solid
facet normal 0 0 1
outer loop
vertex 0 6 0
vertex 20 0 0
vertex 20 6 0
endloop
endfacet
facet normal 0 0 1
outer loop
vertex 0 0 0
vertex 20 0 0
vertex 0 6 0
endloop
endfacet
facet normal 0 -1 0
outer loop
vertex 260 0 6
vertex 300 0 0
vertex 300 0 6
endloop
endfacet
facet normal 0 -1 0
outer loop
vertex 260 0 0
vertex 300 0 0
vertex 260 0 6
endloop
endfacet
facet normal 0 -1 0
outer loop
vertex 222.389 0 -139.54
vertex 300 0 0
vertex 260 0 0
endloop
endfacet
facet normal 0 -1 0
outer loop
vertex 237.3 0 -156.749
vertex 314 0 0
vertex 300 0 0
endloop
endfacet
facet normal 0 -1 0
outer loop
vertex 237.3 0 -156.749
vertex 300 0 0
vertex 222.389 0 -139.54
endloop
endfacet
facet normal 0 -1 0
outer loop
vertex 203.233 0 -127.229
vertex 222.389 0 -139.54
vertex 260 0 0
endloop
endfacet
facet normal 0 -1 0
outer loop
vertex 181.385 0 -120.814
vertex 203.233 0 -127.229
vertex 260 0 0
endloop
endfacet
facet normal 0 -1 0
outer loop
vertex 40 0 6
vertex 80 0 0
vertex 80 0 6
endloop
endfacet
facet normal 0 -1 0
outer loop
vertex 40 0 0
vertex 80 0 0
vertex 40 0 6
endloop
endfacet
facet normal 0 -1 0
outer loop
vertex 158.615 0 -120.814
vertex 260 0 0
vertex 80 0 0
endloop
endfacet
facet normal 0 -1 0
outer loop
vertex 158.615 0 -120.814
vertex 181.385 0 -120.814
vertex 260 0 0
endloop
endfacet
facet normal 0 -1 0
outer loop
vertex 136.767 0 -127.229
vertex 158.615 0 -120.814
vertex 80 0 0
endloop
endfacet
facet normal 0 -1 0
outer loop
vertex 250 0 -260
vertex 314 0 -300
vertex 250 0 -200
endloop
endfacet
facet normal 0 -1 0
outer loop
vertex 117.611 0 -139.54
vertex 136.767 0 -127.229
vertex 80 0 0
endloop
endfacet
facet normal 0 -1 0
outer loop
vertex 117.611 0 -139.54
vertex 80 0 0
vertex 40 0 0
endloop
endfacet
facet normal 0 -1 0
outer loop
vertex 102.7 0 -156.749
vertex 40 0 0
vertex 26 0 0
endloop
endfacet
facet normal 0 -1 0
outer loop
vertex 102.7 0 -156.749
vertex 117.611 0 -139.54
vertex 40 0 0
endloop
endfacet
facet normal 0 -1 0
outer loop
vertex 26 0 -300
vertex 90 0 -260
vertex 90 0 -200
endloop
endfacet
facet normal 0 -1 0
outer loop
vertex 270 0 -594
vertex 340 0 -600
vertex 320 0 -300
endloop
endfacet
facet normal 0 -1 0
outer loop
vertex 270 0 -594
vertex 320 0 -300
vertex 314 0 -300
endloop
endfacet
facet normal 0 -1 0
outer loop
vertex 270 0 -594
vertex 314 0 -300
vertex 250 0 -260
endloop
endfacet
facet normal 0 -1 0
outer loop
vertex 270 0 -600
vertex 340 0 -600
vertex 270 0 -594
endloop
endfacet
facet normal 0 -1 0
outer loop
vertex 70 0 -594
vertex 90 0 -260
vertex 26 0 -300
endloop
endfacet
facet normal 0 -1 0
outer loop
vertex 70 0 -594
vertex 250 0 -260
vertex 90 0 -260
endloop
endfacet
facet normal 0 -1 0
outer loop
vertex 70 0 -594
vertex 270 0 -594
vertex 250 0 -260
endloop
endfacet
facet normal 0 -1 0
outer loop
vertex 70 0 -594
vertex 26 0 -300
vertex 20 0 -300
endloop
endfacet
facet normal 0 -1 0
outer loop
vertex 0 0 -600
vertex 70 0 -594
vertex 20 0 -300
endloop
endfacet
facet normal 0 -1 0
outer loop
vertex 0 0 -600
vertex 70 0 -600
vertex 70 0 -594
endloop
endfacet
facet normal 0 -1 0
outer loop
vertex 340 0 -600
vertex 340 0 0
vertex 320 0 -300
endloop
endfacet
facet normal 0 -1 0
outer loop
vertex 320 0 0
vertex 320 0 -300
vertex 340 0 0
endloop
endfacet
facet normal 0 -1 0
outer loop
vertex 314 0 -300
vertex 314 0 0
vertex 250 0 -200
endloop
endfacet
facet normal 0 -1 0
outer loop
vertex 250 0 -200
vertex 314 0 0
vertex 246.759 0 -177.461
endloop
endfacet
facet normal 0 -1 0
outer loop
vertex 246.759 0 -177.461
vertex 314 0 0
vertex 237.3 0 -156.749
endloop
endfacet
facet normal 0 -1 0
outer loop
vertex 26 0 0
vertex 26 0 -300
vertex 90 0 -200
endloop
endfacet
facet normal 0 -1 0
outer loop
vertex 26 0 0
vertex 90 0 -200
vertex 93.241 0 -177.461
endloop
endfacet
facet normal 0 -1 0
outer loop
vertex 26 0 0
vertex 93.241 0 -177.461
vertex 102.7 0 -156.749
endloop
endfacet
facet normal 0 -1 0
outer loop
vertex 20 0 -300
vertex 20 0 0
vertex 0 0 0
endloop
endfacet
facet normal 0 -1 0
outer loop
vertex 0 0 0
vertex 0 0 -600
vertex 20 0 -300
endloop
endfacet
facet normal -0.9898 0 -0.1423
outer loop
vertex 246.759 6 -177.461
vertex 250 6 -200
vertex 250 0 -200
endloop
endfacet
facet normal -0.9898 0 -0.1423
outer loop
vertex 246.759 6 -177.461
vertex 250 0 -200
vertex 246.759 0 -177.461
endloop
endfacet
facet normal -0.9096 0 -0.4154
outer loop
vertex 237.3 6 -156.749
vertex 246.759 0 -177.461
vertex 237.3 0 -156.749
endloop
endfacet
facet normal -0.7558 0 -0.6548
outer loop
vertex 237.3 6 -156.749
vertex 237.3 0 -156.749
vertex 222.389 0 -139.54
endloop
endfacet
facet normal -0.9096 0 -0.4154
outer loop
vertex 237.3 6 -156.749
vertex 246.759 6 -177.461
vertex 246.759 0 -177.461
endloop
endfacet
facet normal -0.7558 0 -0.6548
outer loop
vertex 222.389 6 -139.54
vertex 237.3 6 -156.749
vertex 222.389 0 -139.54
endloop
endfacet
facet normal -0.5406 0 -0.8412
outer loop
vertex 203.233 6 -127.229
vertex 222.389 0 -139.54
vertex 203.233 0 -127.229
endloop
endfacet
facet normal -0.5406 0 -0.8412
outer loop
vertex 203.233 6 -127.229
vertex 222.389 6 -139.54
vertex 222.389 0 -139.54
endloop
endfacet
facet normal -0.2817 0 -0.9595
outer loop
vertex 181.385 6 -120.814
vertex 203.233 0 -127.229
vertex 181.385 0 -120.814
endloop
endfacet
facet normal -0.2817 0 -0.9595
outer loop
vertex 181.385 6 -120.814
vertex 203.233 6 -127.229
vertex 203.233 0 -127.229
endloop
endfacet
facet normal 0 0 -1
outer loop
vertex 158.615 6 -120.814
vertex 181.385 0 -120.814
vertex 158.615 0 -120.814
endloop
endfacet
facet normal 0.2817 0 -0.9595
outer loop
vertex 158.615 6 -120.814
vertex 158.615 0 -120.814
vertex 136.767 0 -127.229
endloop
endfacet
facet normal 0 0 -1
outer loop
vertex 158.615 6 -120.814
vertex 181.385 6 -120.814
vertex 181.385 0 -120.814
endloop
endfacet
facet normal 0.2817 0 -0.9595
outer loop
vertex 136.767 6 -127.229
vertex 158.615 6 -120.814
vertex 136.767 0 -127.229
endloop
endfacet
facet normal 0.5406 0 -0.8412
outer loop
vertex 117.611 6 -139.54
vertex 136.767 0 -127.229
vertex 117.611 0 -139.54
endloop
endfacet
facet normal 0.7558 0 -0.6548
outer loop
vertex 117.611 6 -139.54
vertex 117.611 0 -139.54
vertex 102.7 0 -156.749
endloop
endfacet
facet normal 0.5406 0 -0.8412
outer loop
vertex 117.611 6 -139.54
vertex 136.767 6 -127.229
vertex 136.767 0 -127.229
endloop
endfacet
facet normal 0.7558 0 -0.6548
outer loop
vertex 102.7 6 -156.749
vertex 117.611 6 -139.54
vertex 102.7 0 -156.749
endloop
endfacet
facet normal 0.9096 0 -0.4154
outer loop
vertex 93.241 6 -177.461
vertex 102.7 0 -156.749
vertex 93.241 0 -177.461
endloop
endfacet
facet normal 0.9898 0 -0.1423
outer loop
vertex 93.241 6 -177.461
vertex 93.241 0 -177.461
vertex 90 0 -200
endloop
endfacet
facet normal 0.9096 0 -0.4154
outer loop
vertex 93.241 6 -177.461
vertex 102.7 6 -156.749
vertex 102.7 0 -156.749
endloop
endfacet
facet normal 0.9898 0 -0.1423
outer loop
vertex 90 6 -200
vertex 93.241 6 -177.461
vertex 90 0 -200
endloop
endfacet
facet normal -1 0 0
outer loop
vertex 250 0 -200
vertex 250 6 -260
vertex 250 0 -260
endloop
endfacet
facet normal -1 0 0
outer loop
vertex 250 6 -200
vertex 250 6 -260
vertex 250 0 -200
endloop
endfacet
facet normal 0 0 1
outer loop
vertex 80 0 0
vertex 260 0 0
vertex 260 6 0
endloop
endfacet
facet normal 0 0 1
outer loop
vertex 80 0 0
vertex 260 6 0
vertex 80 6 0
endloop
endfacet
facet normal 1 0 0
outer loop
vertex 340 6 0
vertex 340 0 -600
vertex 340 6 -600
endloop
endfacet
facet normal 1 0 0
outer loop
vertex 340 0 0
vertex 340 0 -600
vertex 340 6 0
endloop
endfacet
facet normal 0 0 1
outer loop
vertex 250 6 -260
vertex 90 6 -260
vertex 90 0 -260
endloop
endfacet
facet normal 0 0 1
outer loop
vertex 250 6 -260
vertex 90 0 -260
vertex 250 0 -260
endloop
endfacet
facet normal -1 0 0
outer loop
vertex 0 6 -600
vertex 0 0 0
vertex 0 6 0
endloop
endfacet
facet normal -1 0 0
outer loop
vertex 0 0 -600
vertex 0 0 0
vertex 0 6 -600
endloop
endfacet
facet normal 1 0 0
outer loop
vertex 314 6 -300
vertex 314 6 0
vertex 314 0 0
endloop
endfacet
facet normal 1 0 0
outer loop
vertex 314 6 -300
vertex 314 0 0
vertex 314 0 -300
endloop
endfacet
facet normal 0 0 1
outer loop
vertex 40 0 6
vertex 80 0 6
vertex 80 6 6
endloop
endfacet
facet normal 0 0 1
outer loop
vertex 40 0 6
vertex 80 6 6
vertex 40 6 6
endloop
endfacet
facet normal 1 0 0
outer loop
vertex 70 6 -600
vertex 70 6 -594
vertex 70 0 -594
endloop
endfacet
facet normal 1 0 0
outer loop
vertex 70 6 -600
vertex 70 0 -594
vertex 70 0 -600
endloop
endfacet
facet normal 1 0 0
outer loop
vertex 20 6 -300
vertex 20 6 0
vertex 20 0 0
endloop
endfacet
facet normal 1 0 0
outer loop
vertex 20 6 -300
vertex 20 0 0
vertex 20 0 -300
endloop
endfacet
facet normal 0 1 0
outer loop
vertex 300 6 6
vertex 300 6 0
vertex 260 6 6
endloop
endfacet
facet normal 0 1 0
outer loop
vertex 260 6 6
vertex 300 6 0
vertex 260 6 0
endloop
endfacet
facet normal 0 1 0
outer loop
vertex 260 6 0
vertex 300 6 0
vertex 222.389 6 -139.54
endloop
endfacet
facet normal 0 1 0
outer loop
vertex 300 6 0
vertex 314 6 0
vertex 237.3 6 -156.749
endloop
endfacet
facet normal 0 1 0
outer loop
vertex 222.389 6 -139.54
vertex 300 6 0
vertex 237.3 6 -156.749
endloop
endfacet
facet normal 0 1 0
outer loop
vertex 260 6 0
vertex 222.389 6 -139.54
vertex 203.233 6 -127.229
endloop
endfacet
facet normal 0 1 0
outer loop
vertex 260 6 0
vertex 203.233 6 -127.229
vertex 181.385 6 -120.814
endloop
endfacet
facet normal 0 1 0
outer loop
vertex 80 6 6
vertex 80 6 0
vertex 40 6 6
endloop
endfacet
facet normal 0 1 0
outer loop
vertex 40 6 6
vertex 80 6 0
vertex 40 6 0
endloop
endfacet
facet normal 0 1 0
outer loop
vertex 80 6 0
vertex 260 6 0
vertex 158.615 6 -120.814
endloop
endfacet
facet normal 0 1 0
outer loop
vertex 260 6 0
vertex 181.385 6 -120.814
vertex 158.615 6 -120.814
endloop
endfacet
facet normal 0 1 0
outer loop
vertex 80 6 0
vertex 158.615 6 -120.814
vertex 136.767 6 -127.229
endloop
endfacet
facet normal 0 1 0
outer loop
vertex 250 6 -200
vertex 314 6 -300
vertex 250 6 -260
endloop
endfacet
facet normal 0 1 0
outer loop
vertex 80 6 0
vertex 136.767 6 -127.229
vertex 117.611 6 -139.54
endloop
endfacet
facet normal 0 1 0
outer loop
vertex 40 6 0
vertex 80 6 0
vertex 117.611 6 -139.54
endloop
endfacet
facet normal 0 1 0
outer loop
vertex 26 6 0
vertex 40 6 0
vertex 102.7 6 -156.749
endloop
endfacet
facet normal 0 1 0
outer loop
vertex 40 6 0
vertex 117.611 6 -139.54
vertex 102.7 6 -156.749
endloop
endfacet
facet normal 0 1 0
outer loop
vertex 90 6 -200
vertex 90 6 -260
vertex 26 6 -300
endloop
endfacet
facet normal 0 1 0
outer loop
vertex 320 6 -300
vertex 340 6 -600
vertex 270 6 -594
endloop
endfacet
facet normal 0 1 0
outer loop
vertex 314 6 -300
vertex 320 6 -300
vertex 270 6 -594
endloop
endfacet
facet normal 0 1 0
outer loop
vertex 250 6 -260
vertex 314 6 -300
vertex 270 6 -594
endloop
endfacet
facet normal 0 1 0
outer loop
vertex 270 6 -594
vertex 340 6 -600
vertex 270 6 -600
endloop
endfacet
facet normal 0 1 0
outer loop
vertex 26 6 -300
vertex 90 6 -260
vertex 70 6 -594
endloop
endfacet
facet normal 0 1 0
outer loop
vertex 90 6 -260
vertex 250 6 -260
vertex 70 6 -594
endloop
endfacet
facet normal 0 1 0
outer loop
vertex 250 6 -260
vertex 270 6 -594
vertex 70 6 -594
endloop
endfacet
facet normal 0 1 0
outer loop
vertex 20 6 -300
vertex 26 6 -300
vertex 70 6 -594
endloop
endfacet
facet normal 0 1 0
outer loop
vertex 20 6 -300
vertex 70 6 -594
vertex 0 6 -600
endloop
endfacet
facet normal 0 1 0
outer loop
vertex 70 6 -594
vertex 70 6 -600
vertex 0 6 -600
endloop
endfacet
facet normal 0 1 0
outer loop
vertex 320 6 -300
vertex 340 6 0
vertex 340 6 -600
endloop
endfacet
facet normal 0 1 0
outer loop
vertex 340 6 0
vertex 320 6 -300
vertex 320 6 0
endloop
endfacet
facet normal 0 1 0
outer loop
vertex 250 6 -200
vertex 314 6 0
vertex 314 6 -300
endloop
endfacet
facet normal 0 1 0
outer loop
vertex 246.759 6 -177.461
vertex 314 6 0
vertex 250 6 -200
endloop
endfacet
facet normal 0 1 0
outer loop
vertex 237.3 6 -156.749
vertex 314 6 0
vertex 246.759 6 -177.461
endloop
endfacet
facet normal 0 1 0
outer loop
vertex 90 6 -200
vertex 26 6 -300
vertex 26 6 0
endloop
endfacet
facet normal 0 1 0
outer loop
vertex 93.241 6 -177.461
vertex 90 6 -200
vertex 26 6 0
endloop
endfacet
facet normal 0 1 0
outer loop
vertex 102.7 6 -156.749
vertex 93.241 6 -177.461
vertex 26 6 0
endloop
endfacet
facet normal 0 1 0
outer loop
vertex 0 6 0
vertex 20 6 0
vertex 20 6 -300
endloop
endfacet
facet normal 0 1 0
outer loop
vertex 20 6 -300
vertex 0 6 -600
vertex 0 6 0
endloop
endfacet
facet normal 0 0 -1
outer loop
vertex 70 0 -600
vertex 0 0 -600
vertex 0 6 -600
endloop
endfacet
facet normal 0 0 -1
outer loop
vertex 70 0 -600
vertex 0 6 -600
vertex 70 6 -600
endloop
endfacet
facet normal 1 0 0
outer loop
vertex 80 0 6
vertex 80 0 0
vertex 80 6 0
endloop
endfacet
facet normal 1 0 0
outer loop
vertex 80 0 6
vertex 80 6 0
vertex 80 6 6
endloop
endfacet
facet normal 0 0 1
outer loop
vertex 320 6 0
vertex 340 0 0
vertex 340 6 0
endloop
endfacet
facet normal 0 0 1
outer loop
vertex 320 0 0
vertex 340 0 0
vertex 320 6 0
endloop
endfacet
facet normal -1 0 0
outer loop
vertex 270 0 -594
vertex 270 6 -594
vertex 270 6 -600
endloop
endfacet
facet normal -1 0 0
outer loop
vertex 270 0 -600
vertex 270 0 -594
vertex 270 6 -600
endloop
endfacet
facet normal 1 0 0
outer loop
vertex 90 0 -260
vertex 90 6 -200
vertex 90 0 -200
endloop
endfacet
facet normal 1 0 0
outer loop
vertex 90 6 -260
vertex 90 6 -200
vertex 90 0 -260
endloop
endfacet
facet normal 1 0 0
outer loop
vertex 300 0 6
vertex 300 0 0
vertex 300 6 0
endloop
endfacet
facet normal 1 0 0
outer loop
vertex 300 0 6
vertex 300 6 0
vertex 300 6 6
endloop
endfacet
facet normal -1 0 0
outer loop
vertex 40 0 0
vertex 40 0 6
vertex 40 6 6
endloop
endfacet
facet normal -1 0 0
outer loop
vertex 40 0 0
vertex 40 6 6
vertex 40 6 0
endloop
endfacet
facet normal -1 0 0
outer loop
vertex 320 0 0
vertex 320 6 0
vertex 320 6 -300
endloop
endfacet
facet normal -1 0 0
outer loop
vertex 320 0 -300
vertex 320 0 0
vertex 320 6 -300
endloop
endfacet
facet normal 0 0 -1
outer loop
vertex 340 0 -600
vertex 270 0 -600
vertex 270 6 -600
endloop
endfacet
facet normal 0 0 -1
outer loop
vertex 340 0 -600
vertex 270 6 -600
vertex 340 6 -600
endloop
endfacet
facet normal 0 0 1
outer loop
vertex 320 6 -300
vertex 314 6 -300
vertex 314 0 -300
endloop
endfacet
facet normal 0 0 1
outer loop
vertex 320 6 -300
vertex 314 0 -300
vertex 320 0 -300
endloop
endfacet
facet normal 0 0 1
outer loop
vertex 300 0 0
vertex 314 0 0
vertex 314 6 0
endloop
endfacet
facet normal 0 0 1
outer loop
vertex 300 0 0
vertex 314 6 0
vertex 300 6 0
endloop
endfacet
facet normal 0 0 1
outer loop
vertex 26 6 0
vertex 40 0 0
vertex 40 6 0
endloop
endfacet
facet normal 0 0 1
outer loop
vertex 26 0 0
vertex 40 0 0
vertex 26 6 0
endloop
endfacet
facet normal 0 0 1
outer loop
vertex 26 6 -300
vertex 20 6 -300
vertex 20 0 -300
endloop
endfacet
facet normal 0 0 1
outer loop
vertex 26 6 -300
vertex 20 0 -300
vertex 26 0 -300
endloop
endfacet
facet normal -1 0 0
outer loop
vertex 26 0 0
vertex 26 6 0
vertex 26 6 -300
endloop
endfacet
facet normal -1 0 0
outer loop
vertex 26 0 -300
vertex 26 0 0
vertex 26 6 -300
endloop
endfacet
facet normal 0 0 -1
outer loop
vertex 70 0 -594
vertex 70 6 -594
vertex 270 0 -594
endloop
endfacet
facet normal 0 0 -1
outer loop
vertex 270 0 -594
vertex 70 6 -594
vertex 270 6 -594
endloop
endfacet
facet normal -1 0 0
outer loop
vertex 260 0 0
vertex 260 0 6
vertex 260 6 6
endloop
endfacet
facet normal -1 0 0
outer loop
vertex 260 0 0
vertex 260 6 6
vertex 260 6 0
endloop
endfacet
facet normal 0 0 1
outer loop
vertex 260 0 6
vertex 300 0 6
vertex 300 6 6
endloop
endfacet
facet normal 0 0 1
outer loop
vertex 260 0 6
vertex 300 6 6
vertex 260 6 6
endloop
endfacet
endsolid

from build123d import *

# Parameters (mm, degrees)
BOSS_EXTRUDE1_DEPTH = 6
SKETCH2_W           = 6
SKETCH2_H           = 300
CUT_EXTRUDE1_DEPTH  = 6
LPATTERN1_COUNT     = 2
LPATTERN1_PITCH     = 294
SKETCH3_W           = 200
SKETCH3_H           = 6
CUT_EXTRUDE2_DEPTH  = 6


with BuildPart() as part:
    # Sketch1 → Boss-Extrude1 (new body)
    with BuildSketch(Plane(origin=(0, 0, 0), x_dir=(1, 0, 0), z_dir=(0, 1, 0))):
        Polygon((300, 0), (300, -6), (260, -6), (260, 0), (80, 0), (80, -6), (40, -6), (40, 0), (0, 0), (0, 600), (340, 600), (340, 0), align=None)
    extrude(amount=BOSS_EXTRUDE1_DEPTH)

    # Sketch2 → Cut-Extrude1 (cut)
    with BuildSketch(Plane(origin=(0, 6, 0), x_dir=(1, 0, 0), z_dir=(0, 1, 0))):
        with Locations((23, 150)):
            Rectangle(SKETCH2_W, SKETCH2_H)
    cut_extrude1 = extrude(amount=-CUT_EXTRUDE1_DEPTH, mode=Mode.SUBTRACT)

    # LPattern1: Cut-Extrude1 ×2
    with Locations(*[(i * LPATTERN1_PITCH, 0, 0) for i in range(1, LPATTERN1_COUNT)]):
        add(cut_extrude1, mode=Mode.SUBTRACT)

    # Sketch3 → Cut-Extrude2 (cut)
    with BuildSketch(Plane(origin=(0, 6, 0), x_dir=(1, 0, 0), z_dir=(0, 1, 0))):
        with BuildLine():
            Line((90, 200), (90, 260))
            Line((90, 260), (250, 260))
            Line((250, 260), (250, 200))
            ThreePointArc((250, 200), (170, 120), (90, 200))
        make_face()
        with Locations((170, 597)):
            Rectangle(SKETCH3_W, SKETCH3_H)
    extrude(amount=-CUT_EXTRUDE2_DEPTH, mode=Mode.SUBTRACT)


solid = part.part
